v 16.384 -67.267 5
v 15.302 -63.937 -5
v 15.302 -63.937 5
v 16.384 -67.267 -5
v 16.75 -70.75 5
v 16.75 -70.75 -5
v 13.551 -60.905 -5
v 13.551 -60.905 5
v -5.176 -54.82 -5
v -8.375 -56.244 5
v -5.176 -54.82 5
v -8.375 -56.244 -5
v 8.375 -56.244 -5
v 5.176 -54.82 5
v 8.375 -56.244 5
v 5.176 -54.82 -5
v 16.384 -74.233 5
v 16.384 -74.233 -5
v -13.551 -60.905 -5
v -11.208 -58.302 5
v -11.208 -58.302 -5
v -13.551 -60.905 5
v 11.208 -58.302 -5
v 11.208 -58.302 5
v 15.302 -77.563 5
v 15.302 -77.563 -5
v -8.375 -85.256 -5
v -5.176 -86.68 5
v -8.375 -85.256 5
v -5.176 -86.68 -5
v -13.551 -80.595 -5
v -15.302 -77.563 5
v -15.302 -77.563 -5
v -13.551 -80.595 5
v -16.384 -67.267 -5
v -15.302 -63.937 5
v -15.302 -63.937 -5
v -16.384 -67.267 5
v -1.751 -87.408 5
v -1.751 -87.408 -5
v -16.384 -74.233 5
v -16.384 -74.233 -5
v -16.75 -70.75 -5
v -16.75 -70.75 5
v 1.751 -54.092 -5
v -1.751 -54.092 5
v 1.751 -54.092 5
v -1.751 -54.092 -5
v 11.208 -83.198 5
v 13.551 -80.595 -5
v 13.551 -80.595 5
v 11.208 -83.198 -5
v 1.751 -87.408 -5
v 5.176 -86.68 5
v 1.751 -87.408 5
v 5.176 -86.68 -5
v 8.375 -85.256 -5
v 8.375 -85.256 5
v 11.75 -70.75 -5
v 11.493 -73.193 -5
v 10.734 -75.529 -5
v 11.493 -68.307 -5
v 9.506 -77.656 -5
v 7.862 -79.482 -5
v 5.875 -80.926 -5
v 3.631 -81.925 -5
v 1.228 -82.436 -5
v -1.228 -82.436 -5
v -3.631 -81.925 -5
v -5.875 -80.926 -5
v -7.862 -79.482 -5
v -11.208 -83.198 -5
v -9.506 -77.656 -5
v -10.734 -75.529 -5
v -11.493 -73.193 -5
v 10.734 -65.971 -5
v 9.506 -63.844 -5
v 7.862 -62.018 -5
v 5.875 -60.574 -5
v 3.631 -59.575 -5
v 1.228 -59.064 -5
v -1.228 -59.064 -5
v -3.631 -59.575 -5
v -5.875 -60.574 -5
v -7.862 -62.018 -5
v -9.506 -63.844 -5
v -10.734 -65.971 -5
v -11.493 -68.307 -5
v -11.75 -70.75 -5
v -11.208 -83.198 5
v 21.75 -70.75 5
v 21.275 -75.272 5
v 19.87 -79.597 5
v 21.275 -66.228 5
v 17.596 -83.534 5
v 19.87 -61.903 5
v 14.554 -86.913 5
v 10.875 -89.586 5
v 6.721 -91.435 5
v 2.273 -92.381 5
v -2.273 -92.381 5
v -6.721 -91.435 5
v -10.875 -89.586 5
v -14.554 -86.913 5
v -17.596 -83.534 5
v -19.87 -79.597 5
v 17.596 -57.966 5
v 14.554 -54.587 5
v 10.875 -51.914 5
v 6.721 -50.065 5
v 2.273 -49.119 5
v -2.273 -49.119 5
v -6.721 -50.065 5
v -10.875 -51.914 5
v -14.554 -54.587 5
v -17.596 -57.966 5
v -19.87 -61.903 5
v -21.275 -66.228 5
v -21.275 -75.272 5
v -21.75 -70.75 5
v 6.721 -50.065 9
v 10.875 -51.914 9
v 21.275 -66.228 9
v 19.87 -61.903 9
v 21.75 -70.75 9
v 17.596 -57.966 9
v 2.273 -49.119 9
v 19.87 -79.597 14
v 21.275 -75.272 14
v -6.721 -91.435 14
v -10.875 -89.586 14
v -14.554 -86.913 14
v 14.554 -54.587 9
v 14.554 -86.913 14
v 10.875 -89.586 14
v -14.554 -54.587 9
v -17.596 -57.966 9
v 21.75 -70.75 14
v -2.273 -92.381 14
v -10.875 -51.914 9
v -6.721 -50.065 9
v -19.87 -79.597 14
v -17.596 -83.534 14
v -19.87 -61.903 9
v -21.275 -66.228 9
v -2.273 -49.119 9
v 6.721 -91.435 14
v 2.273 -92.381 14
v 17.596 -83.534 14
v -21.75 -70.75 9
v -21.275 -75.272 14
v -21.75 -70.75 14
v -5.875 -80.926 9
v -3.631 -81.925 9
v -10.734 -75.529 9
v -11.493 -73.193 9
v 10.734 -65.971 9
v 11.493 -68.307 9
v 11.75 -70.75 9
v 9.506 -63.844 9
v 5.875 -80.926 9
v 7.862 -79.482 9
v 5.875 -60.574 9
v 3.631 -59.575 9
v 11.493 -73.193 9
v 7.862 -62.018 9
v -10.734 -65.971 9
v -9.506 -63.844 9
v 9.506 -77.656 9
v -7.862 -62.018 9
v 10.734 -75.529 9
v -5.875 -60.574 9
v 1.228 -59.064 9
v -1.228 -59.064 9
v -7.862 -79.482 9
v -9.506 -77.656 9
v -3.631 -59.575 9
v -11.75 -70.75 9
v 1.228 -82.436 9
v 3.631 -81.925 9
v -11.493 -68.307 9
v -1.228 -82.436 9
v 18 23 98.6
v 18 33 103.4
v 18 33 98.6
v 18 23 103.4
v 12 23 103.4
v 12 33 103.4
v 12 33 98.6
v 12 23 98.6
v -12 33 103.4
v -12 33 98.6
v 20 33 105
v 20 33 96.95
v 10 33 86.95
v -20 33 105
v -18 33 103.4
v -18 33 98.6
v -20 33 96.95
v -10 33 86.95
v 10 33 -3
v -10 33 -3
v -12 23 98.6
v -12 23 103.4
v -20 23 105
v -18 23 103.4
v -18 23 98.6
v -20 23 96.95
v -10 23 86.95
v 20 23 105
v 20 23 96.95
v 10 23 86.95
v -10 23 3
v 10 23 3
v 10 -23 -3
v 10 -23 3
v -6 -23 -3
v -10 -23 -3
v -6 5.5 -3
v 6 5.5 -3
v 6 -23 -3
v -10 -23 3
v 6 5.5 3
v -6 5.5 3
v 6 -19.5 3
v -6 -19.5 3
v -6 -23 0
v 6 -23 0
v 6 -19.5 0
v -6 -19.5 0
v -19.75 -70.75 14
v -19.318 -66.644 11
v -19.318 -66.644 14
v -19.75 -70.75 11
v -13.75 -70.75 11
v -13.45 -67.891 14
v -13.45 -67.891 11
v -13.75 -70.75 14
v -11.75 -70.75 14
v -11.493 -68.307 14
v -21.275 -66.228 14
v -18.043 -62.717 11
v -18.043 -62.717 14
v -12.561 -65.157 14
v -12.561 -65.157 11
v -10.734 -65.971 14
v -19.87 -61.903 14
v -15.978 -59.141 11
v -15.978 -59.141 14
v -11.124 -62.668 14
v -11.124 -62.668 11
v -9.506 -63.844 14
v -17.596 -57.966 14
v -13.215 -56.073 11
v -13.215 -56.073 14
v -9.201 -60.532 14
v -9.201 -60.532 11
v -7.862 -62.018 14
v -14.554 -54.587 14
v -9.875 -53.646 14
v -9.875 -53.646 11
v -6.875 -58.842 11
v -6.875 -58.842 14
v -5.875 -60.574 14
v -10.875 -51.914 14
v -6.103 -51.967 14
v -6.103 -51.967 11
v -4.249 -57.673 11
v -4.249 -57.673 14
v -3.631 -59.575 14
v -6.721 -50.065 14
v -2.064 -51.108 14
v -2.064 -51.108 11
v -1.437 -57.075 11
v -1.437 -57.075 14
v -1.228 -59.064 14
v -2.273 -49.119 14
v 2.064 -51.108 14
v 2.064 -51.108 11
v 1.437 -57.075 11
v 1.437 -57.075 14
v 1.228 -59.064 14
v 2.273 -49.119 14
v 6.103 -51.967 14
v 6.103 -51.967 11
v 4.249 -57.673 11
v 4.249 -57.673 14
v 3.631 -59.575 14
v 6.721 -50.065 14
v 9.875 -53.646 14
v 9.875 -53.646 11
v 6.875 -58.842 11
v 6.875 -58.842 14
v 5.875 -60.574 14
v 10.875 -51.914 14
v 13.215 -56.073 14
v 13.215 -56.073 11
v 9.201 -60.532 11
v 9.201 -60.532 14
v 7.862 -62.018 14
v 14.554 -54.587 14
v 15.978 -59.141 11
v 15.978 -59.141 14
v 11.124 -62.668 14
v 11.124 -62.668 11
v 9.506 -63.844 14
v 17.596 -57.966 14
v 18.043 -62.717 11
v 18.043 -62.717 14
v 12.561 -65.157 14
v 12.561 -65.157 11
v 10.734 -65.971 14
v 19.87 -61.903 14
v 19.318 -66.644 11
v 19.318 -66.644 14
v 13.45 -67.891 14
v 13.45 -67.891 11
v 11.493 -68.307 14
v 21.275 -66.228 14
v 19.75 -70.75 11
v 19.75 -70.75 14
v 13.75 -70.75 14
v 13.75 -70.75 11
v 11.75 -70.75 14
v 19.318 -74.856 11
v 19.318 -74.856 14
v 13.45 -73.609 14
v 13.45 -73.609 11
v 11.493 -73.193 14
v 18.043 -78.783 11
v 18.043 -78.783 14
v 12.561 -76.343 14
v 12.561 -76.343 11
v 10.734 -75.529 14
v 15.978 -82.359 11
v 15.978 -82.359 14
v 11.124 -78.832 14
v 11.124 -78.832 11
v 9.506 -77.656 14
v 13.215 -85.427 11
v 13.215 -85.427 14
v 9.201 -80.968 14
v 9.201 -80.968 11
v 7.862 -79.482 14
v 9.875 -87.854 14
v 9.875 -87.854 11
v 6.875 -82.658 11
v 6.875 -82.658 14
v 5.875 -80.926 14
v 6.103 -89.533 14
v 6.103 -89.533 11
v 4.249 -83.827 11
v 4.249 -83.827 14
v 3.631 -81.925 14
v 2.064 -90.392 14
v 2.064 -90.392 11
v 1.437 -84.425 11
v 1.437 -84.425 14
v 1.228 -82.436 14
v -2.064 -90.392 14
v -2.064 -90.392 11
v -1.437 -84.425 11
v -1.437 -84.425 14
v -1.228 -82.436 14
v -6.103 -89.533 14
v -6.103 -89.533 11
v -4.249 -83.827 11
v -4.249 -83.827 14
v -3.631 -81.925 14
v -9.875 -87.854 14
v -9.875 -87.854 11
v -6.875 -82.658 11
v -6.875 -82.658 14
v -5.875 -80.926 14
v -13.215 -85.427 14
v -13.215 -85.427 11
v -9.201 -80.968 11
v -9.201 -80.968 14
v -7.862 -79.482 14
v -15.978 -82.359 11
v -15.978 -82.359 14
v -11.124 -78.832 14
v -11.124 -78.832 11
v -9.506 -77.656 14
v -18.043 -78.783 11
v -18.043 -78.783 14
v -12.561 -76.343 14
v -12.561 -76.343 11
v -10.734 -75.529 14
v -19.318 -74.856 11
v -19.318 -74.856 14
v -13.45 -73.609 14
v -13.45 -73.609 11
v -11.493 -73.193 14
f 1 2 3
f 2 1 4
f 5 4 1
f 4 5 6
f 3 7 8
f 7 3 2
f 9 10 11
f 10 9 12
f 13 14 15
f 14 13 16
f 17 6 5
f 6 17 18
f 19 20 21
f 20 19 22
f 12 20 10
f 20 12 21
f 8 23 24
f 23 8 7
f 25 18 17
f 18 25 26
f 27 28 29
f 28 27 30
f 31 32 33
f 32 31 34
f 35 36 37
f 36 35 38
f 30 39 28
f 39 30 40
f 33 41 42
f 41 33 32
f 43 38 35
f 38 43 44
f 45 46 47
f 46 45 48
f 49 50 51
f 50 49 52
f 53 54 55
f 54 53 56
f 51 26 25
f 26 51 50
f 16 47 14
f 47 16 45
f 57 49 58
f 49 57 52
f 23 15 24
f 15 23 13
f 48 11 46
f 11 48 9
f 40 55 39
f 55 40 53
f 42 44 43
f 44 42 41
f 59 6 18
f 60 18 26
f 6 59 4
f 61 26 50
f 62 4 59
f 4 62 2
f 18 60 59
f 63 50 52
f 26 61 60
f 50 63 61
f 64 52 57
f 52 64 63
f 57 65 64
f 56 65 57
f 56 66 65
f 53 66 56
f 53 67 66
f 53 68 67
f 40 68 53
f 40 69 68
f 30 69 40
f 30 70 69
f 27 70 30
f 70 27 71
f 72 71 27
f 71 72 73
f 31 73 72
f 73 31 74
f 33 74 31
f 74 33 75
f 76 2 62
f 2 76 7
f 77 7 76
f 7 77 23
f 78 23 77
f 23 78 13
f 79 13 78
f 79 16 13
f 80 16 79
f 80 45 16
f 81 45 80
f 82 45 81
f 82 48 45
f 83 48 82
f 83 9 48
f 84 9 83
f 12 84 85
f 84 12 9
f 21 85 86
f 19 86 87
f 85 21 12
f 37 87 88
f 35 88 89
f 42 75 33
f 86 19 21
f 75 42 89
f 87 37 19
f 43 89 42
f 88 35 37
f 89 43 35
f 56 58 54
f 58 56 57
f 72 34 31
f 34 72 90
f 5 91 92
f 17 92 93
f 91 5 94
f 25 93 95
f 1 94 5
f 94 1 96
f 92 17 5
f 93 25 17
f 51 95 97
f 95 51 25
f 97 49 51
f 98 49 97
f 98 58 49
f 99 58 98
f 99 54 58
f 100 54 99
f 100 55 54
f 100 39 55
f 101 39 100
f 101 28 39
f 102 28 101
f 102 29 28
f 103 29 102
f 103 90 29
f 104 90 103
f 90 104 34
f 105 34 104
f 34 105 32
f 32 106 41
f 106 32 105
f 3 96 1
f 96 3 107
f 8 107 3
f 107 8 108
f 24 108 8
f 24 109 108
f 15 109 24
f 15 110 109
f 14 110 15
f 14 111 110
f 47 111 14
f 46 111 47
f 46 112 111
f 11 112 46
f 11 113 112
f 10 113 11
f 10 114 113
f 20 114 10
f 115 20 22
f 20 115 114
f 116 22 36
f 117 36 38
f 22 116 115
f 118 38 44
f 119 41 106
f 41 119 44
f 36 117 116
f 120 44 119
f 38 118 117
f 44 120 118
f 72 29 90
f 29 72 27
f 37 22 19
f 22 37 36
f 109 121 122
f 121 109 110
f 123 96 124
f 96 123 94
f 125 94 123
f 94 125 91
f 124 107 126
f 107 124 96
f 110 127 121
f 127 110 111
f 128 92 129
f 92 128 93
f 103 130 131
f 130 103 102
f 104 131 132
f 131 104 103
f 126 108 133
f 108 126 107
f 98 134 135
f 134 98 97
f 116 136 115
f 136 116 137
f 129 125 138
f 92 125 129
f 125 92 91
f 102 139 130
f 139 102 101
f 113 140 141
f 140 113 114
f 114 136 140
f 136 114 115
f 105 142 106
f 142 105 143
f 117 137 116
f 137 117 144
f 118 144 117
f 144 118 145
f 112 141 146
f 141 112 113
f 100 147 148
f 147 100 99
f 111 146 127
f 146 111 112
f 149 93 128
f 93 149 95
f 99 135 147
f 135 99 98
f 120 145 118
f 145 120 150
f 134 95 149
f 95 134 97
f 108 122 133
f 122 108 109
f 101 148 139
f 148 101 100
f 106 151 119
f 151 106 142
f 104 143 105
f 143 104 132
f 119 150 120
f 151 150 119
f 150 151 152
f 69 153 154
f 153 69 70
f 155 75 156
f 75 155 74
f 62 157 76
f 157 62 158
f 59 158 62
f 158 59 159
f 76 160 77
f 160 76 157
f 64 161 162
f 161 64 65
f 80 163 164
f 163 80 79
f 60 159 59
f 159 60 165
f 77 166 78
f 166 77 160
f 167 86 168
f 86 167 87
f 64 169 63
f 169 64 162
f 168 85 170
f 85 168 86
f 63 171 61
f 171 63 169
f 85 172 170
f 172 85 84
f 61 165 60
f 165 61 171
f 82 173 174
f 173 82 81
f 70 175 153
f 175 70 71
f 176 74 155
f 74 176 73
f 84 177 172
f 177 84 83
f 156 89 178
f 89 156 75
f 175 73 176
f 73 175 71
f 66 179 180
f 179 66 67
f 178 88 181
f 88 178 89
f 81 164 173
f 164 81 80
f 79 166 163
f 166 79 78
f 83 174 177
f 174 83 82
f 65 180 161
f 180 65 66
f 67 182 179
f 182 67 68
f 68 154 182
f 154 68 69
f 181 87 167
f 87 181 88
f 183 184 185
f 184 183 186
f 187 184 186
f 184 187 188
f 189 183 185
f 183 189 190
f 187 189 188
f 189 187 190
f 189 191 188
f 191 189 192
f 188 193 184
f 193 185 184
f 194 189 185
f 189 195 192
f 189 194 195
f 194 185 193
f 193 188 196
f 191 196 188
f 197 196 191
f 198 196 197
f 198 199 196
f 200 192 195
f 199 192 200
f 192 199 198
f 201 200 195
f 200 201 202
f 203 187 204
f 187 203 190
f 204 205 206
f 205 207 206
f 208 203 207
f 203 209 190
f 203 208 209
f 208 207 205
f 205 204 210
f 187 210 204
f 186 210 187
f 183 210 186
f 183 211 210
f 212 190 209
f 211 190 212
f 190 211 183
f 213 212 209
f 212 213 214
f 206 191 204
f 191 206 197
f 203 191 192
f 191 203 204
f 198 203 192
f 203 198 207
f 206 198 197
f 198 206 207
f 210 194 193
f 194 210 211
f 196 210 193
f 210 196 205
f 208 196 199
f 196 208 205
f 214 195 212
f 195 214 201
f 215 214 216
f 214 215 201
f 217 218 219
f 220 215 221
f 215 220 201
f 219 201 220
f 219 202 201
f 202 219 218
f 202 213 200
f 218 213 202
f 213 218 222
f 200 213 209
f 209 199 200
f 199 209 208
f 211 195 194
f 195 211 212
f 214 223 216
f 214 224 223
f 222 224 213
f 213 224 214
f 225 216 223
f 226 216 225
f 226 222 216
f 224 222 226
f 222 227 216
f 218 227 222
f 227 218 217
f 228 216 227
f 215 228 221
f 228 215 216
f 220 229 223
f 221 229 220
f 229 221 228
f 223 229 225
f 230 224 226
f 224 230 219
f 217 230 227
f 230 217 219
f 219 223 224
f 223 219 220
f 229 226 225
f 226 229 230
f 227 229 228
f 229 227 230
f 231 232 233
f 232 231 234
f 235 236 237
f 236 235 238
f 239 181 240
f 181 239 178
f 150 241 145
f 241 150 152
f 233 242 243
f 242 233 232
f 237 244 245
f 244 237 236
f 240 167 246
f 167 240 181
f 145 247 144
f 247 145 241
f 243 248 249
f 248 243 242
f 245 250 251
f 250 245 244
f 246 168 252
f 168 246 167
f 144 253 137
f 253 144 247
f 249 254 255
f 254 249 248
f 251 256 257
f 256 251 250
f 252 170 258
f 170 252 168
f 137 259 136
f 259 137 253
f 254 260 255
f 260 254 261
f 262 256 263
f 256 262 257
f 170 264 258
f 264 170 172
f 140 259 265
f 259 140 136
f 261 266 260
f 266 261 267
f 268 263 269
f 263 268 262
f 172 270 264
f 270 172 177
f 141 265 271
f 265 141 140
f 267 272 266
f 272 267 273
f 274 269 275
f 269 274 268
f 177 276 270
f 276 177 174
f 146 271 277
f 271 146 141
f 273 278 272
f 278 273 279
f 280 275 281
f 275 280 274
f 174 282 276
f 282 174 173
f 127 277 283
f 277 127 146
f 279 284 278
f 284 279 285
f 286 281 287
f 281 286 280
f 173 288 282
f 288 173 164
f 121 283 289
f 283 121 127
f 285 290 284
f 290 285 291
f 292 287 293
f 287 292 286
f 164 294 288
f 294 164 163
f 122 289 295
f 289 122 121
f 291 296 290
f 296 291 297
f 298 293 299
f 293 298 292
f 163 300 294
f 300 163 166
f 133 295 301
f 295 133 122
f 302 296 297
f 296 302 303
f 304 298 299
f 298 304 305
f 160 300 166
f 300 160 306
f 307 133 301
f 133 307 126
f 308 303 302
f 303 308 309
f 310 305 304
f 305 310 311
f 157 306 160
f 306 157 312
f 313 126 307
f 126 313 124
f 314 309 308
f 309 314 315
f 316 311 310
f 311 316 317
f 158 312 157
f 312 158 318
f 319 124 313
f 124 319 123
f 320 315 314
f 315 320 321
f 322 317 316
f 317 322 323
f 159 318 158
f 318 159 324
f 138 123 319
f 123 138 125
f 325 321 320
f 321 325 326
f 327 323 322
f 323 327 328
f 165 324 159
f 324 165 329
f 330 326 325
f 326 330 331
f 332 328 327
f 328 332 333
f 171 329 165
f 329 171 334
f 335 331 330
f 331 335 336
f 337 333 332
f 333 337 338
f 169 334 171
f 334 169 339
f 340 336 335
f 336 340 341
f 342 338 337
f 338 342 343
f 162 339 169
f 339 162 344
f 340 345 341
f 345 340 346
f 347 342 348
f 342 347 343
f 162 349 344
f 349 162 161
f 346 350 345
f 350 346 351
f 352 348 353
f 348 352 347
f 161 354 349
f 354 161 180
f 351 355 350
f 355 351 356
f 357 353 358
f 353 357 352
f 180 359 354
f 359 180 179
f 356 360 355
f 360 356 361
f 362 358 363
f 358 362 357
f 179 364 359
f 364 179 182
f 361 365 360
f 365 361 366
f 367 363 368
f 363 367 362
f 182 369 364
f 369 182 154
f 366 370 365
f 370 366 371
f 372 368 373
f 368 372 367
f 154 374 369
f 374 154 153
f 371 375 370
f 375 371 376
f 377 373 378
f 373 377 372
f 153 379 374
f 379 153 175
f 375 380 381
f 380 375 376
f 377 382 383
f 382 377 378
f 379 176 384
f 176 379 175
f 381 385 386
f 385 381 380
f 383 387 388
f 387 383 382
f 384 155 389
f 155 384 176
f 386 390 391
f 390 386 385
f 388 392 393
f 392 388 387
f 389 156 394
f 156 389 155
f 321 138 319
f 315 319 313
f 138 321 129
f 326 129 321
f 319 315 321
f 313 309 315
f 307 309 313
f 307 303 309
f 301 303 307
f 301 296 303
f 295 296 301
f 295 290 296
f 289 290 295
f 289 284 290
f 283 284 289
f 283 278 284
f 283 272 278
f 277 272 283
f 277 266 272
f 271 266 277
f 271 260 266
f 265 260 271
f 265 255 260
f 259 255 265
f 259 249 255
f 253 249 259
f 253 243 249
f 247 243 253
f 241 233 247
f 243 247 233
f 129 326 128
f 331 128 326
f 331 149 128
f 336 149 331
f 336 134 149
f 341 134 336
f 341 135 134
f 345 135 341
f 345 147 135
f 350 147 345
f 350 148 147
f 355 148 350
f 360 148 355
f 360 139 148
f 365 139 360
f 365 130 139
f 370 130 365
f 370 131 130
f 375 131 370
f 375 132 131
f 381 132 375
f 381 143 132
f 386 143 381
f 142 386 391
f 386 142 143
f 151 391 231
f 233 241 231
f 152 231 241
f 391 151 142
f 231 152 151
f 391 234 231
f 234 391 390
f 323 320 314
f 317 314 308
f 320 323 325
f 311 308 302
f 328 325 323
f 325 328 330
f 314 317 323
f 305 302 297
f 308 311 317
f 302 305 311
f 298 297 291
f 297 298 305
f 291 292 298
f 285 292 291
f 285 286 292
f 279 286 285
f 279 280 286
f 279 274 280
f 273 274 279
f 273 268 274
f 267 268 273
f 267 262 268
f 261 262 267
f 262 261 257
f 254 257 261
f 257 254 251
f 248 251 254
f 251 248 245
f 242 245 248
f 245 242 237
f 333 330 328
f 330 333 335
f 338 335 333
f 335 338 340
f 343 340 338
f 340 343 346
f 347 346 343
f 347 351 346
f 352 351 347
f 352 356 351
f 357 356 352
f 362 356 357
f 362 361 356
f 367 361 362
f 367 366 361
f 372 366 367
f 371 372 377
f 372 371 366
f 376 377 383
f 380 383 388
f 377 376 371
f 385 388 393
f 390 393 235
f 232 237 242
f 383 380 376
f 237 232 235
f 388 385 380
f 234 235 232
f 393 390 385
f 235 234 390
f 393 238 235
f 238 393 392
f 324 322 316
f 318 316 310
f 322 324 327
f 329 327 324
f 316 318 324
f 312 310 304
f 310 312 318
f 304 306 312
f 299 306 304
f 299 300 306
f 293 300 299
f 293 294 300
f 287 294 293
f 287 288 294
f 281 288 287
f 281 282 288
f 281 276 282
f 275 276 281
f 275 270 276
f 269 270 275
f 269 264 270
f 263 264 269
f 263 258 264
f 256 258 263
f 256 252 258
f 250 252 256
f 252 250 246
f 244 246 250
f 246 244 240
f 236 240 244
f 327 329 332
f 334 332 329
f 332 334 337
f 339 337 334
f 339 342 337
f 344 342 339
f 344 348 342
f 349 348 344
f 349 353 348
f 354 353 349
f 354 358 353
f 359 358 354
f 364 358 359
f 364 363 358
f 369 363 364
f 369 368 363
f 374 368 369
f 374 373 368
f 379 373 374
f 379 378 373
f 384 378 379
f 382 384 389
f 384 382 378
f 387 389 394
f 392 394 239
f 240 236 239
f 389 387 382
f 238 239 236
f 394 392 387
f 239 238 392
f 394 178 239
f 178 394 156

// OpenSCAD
// file: hangon_clickin.scad
include <servo.scad>
include <parameters.scad>

//%back_holes();

module hangon(){
    //support
    mirror_copy([1,0,0])translate([hangon_support_distance,-hangon_support_length/2-(contact_delta/2)+5,-(5-(top_component_height*0.5))/2])
    cube([round(top_component_width*0.1),hangon_support_length+contact_delta,top_component_height*0.5], true);

    //base
    translate([0,shaft_center,0])
    difference(){
        cube([hangon_base_diameter,hangon_base_diameter,5], true);
        cylinder(10, hangon_base_diameter/2-5, hangon_base_diameter/2-5, true);
    }
}
// file: bearing_holder.scad
include <servo.scad>
include <parameters.scad>
include <hangon_clickin.scad>

%hangon();
shaft_hole_width = hangon_base_diameter/2-5;
holder_width = shaft_hole_width-1;
holder_height = 10;
bearing_pit_width = holder_width+5;
bearing_pit_height = 4;
shaft_hole_radius = holder_width-5;
wall_width = 2;
wall_height = 5;
pit_width = 10;

translate([0,shaft_center,0])
union(){
    difference(){
        //base
        union(){
            //holder
            cylinder(holder_height, holder_width, holder_width, true);
            //bearing pit base
            translate([0,0,holder_height/2+bearing_pit_height/2])
            cylinder(bearing_pit_height, bearing_pit_width, bearing_pit_width, true);
        }
        //shaft hole
        translate([0,0,bearing_pit_height/2])
        cylinder(holder_height+bearing_pit_height, shaft_hole_radius, shaft_hole_radius, true);
    }
}
//bearing pit
translate([0,shaft_center,-(shaft_hole_radius-(holder_height/2+bearing_pit_height))])
rotate_extrude(angle = 360, convexity = 10){
    polygon(points=[[shaft_hole_radius,shaft_hole_radius], [shaft_hole_radius+pit_width, shaft_hole_radius], [shaft_hole_radius+pit_width, shaft_hole_radius+wall_height], [shaft_hole_radius+pit_width-wall_width,shaft_hole_radius+wall_height], [shaft_hole_radius+pit_width-wall_width,shaft_hole_radius+wall_width], [shaft_hole_radius+wall_width,shaft_hole_radius+wall_width], [shaft_hole_radius+wall_width,shaft_hole_radius+wall_height], [shaft_hole_radius,shaft_hole_radius+wall_height]]);
};
// file: servo.scad
//parameters
servo_width = 12;
servo_length = 24;
servo_height = 24;
ex_length = 5;
ex_height = 4;
shaft_offset = 5;
shaft_radius = 5;
shaft_height = 5;

module mirror_copy(vec=[0,1,0]){
    children();
    mirror(vec)children();
}

module back_holes(){
    mirror_copy([1,0,0])translate([top_component_width/2-round((top_component_width*0.1)/2)-3,0,0])
    cube([round(top_component_width*0.15),back_component_length,top_component_height*0.6], true);    
}

module servo(){
    translate([0,0,servo_height/2])
    union(){
        //extrusion
        mirror_copy()
            translate([0,servo_length/2+ex_length/2,(servo_height/2)-ex_height/2])
                cube([servo_width, ex_length, ex_height], true);
        //shaft
        translate([0,-servo_length/2+shaft_radius,servo_height/2+shaft_height/2])
        cylinder(shaft_height, shaft_radius, shaft_radius, true);
        //base
        cube([servo_width, servo_length, servo_height], true);
    }
}
// file: base_clickin.scad
include <servo.scad>
include <parameters.scad>

module tower_base(){
    union(){
        //back tower
        union(){
            translate([0,back_offset,(back_component_height/2)-base_height/2])
            union(){
                //back holes
                translate([0,0,back_component_height/2+top_component_height/2])
                difference(){
                    cube([top_component_width,back_component_length,top_component_height], true);
                    back_holes();
                    
                }
                //back component
                cube([outer_width,back_component_length,back_component_height], true);
                //triangle supports
                hull(){
                    translate([0,0,back_component_height/2])
                    cube([top_component_width,back_component_length,0.1], true);
                    translate([0,0,back_component_height/2-10])
                    cube([outer_width,back_component_length,0.1], true);
                }
            }
        }
        //base
        difference(){
            difference(){
                cube([outer_width,outer_length,base_height], true);
                translate([0,-front_offset,0])
                cube([inner_width,inner_length,base_height], true);
            }
            translate([0,-outer_length/2+2,-2])
            cube([inner_width,4,4], true);
        }
    }
}

tower_base();
translate([0,-front_offset,0])
%servo();
// file: bearing_disc.scad
include <parameters.scad>
include <bearing_holder.scad>

/*
translate([0,-shaft_center,0])
bearing_holder();
*/

module bearing_disc(){
    translate([0, 0, 0])
    difference(){
    union(){
        difference(){
            union(){
                //lock high 1
                translate([0,hole_width/2+1,0])
                cube([disc_radius,4,disc_height+1]);
                //lock low 1
                translate([0,-1,0])
                hull(){
                    translate([0,-hole_width*1.5,0])
                    cube([disc_radius,0.1,disc_height-1]);
                    translate([0,-hole_width/2,0])
                    cube([disc_radius,0.1,disc_height]);
                }
                //lock high 2
                rotate([0,0,180])
                translate([0,hole_width/2+1,0])
                cube([disc_radius,4,disc_height+1]);
                //lock low 2
                rotate([0,0,180])
                translate([0,-1,0])
                hull(){
                    translate([0,-hole_width*1.5,0])
                    cube([disc_radius,0.1,disc_height-1]);
                    translate([0,-hole_width/2,0])
                    cube([disc_radius,0.1,disc_height]);
                }
                //disc
                cylinder(disc_height,disc_radius,disc_radius, true);
            }
            //shaft hole
            cylinder(disc_height+10, shaft_raidus, shaft_raidus, true);
        }
    }
    difference(){
        cylinder(10,disc_radius+10,disc_radius+10, true);
        cylinder(10,disc_radius, disc_radius, true);
    }
}
}
// file: parameters.scad
//parameters

//base
back_length = 10;
outer_width = 20;
outer_length = 36+back_length;
inner_width = 12;
inner_length = 25;
base_height = 6;
front_offset = round((outer_length-inner_length)/2)-4;
back_component_length = 10;
back_component_height = 100;
back_offset = outer_length/2+back_component_length/2;
top_component_height = 8;
top_component_width = 40;

//hangon
contact_delta = 50;
hangon_support_length = 8;
hangon_support_delta = 2.5;
hangon_support_distance = (top_component_width/2-round((top_component_width*0.1)/2)-hangon_support_delta);
shaft_center = (-hangon_support_length-((hangon_support_distance+10)/2))-contact_delta;
hangon_base_diameter = hangon_support_distance+30;

//fixture
top_part_diplacement = 8;
leg_width = 2;
clickon_height = 2;

//bearing_pit
shaft_hole_width = hangon_base_diameter/2-5;
holder_width = shaft_hole_width-1;
holder_height = 10;
bearing_pit_width = holder_width+5;
bearing_pit_height = 4;
shaft_hole_radius = holder_width-5;
wall_width = 2;
wall_height = 5;
pit_width = 10;

//bearing_disc
//disc_radius = shaft_hole_radius+pit_width;
disc_radius = 10;
disc_height = 4;
hole_length = (shaft_hole_radius*2)-2;
hole_width = 2;
shaft_raidus = (hole_length/2)*0.6;

//servo
servo_width = 12;
servo_length = 24;
servo_height = 24;
ex_length = 5;
ex_height = 4;
shaft_radius = 5;
shaft_height = 5;
shaft_offset = -servo_length/2+shaft_radius+3;

//ball bearings
ball_bearing_length = 8;
ball_bearing_height = 3;

//shaft
shaft_girth = shaft_raidus-(0.5/2);
shaft_pole_height = 60;
shaft_grip_height = 5;
shaft_fitting = 4;
pole_up_trans = back_component_height/2-(servo_height/2+shaft_height/2)+((servo_height+shaft_height)-shaft_pole_height/2)+shaft_fitting;
//lock_ex_width = hole_width*0.8;
lock_ex_width = 2;
//lock_ex_length = hole_length-0.5;
lock_ex_length = 2;
lock_ex_displacement = -17.6;

//shaft_grip
shaft_grip_radius = 12;



//complete 
bearing_delta = 4;
center_on_shaft = front_offset-shaft_offset;
// main file
include <parameters.scad>
include <bearing_disc.scad>
include <base_clickin.scad>
include <servo.scad>

/*
translate([0,0,bearing_delta])
%bearing_disc();


//tower base and servo
rotate([0,180,0])   
translate([0,center_on_shaft,-back_component_height])
union(){
    tower_base();
    translate([0,-front_offset,0])
    %servo();
}

*/
module shaft(){
    union(){
        translate([0,0,shaft_pole_height/2+shaft_grip_height/2])
        cylinder(shaft_grip_height, shaft_girth, shaft_girth, true);
        //shaft
        cylinder(shaft_pole_height, shaft_girth, shaft_girth, true);
        //lock ex
        translate([0,0,lock_ex_displacement])
        cube([lock_ex_length, lock_ex_width, disc_height], true);
    }
}

/*
translate([0,0,pole_up_trans])
shaft();
*/

//shaft();
